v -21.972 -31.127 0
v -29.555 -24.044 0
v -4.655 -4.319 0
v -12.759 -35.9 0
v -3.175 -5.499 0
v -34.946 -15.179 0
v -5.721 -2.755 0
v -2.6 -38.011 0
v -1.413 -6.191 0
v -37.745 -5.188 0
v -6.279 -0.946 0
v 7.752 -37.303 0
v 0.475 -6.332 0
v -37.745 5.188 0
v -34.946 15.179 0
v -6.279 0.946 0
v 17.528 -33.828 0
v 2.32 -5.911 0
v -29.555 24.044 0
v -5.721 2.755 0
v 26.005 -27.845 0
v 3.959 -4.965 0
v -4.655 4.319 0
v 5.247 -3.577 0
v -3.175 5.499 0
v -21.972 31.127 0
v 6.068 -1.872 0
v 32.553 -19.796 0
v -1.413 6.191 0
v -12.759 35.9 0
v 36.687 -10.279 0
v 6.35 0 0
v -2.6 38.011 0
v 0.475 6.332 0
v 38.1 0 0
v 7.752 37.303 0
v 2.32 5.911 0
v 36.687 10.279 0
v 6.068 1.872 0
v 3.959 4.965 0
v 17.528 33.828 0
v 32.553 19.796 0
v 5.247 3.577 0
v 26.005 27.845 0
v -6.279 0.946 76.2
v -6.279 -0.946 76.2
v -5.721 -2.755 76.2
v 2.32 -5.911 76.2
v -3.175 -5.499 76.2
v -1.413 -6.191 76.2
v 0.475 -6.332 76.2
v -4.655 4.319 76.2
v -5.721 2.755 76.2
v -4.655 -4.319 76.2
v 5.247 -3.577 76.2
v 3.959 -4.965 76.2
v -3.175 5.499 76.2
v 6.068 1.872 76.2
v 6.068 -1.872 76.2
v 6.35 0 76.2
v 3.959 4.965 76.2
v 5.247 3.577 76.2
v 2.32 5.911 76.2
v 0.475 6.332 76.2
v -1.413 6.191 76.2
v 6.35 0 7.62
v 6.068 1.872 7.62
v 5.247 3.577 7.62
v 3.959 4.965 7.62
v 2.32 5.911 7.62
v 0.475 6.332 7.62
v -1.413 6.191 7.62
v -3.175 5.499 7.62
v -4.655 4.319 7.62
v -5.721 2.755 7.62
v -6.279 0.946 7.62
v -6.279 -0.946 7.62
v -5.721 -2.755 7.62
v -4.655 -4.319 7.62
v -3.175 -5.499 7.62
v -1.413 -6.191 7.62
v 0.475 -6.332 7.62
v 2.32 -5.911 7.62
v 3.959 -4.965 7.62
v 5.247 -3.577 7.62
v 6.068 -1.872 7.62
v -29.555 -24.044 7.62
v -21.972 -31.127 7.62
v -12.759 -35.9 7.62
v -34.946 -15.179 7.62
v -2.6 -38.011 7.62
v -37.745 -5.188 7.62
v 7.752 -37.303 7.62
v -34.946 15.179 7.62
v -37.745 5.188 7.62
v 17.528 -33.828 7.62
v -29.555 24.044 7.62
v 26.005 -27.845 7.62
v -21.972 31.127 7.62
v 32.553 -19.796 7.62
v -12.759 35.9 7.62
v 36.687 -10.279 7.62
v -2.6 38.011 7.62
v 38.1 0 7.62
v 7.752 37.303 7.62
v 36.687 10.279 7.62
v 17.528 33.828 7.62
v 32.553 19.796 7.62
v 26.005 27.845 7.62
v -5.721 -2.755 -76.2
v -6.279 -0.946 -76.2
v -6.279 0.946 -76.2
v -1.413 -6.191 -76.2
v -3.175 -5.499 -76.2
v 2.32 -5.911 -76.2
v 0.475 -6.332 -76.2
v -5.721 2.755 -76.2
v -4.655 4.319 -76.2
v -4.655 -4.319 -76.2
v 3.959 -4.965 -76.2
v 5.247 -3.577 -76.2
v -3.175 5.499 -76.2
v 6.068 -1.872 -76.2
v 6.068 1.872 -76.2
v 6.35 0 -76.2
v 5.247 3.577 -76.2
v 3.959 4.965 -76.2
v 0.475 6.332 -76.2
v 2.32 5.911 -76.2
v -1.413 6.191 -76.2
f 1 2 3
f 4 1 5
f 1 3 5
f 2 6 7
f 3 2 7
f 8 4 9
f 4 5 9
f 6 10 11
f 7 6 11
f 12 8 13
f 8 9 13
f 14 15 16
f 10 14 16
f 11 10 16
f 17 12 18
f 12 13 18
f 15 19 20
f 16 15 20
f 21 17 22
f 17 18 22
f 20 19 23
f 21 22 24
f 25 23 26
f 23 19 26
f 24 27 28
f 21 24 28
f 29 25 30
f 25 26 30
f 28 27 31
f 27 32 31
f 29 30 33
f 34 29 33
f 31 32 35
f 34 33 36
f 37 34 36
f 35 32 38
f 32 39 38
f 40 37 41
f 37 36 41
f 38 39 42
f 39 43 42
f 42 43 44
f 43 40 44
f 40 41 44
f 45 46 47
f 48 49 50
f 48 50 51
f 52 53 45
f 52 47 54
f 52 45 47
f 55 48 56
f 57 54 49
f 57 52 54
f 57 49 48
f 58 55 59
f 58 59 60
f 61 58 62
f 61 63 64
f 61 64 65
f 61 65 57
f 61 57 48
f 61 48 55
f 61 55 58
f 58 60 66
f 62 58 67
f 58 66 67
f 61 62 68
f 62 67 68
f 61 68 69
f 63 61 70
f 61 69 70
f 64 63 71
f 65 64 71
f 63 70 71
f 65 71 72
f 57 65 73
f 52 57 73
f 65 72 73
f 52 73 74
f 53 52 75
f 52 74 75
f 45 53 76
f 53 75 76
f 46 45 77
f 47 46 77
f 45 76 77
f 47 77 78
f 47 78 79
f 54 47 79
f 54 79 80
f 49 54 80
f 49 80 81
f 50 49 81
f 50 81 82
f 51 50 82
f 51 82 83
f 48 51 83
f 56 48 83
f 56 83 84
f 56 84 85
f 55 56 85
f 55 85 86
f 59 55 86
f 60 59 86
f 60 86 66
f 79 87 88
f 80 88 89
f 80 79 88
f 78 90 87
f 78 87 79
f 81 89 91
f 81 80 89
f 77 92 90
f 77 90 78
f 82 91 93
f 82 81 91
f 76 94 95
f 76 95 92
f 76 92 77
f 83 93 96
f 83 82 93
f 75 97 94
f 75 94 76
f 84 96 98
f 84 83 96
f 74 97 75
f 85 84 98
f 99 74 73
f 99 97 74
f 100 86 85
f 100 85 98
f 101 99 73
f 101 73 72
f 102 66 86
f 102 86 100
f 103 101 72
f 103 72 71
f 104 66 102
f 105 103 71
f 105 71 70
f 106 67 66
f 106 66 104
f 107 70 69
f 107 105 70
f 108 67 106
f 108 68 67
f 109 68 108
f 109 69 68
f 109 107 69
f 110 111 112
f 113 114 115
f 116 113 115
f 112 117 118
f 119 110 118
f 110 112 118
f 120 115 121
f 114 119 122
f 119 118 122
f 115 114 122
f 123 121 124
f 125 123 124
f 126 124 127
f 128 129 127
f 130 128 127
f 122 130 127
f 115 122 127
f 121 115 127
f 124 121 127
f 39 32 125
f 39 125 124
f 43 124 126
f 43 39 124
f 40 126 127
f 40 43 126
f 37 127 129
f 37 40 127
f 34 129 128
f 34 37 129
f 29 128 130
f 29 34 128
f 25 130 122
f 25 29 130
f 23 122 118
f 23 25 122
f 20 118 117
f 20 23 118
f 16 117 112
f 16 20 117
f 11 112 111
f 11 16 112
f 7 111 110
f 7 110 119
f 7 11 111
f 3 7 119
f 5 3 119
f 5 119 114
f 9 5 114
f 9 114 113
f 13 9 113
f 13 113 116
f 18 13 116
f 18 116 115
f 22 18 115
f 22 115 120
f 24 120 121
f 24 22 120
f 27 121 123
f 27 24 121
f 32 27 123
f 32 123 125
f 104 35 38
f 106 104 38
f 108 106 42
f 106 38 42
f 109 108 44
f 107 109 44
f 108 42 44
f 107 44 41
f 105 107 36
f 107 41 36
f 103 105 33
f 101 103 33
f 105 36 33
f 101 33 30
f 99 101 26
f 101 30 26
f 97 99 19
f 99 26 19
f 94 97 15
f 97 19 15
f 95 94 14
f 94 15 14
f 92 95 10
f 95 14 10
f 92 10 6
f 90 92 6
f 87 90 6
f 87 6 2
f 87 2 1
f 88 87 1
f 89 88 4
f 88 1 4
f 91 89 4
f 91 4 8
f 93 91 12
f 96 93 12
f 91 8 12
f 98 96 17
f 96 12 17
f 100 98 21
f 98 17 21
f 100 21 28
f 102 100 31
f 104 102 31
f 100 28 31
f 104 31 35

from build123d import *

# Parameters (mm, degrees)
F0_R          = 38.1
F1_DEPTH      = 7.62
F3_D          = 12.7
F4_R          = 6.35
F5_DEPTH      = 76.2
F5_DEPTH_BACK = 76.2


with BuildPart() as f1:
    # F0 (on Top) → F1 (new body)
    with BuildSketch(Plane.XY):
        Circle(F0_R)
    extrude(amount=F1_DEPTH)

    # F3 (through all)
    with Locations(Plane(origin=(0, 0, 0), x_dir=(1, 0, 0), z_dir=(0, 0, -1))):
        with Locations((0, 0)):
            Hole(F3_D / 2)

    # F4 (on Top) → F5 (join, two sides)
    with BuildSketch(Plane.XY) as f5_sk:
        Circle(F4_R)
    extrude(amount=F5_DEPTH)
    extrude(f5_sk.sketch, amount=-F5_DEPTH_BACK)


solid = f1.part
